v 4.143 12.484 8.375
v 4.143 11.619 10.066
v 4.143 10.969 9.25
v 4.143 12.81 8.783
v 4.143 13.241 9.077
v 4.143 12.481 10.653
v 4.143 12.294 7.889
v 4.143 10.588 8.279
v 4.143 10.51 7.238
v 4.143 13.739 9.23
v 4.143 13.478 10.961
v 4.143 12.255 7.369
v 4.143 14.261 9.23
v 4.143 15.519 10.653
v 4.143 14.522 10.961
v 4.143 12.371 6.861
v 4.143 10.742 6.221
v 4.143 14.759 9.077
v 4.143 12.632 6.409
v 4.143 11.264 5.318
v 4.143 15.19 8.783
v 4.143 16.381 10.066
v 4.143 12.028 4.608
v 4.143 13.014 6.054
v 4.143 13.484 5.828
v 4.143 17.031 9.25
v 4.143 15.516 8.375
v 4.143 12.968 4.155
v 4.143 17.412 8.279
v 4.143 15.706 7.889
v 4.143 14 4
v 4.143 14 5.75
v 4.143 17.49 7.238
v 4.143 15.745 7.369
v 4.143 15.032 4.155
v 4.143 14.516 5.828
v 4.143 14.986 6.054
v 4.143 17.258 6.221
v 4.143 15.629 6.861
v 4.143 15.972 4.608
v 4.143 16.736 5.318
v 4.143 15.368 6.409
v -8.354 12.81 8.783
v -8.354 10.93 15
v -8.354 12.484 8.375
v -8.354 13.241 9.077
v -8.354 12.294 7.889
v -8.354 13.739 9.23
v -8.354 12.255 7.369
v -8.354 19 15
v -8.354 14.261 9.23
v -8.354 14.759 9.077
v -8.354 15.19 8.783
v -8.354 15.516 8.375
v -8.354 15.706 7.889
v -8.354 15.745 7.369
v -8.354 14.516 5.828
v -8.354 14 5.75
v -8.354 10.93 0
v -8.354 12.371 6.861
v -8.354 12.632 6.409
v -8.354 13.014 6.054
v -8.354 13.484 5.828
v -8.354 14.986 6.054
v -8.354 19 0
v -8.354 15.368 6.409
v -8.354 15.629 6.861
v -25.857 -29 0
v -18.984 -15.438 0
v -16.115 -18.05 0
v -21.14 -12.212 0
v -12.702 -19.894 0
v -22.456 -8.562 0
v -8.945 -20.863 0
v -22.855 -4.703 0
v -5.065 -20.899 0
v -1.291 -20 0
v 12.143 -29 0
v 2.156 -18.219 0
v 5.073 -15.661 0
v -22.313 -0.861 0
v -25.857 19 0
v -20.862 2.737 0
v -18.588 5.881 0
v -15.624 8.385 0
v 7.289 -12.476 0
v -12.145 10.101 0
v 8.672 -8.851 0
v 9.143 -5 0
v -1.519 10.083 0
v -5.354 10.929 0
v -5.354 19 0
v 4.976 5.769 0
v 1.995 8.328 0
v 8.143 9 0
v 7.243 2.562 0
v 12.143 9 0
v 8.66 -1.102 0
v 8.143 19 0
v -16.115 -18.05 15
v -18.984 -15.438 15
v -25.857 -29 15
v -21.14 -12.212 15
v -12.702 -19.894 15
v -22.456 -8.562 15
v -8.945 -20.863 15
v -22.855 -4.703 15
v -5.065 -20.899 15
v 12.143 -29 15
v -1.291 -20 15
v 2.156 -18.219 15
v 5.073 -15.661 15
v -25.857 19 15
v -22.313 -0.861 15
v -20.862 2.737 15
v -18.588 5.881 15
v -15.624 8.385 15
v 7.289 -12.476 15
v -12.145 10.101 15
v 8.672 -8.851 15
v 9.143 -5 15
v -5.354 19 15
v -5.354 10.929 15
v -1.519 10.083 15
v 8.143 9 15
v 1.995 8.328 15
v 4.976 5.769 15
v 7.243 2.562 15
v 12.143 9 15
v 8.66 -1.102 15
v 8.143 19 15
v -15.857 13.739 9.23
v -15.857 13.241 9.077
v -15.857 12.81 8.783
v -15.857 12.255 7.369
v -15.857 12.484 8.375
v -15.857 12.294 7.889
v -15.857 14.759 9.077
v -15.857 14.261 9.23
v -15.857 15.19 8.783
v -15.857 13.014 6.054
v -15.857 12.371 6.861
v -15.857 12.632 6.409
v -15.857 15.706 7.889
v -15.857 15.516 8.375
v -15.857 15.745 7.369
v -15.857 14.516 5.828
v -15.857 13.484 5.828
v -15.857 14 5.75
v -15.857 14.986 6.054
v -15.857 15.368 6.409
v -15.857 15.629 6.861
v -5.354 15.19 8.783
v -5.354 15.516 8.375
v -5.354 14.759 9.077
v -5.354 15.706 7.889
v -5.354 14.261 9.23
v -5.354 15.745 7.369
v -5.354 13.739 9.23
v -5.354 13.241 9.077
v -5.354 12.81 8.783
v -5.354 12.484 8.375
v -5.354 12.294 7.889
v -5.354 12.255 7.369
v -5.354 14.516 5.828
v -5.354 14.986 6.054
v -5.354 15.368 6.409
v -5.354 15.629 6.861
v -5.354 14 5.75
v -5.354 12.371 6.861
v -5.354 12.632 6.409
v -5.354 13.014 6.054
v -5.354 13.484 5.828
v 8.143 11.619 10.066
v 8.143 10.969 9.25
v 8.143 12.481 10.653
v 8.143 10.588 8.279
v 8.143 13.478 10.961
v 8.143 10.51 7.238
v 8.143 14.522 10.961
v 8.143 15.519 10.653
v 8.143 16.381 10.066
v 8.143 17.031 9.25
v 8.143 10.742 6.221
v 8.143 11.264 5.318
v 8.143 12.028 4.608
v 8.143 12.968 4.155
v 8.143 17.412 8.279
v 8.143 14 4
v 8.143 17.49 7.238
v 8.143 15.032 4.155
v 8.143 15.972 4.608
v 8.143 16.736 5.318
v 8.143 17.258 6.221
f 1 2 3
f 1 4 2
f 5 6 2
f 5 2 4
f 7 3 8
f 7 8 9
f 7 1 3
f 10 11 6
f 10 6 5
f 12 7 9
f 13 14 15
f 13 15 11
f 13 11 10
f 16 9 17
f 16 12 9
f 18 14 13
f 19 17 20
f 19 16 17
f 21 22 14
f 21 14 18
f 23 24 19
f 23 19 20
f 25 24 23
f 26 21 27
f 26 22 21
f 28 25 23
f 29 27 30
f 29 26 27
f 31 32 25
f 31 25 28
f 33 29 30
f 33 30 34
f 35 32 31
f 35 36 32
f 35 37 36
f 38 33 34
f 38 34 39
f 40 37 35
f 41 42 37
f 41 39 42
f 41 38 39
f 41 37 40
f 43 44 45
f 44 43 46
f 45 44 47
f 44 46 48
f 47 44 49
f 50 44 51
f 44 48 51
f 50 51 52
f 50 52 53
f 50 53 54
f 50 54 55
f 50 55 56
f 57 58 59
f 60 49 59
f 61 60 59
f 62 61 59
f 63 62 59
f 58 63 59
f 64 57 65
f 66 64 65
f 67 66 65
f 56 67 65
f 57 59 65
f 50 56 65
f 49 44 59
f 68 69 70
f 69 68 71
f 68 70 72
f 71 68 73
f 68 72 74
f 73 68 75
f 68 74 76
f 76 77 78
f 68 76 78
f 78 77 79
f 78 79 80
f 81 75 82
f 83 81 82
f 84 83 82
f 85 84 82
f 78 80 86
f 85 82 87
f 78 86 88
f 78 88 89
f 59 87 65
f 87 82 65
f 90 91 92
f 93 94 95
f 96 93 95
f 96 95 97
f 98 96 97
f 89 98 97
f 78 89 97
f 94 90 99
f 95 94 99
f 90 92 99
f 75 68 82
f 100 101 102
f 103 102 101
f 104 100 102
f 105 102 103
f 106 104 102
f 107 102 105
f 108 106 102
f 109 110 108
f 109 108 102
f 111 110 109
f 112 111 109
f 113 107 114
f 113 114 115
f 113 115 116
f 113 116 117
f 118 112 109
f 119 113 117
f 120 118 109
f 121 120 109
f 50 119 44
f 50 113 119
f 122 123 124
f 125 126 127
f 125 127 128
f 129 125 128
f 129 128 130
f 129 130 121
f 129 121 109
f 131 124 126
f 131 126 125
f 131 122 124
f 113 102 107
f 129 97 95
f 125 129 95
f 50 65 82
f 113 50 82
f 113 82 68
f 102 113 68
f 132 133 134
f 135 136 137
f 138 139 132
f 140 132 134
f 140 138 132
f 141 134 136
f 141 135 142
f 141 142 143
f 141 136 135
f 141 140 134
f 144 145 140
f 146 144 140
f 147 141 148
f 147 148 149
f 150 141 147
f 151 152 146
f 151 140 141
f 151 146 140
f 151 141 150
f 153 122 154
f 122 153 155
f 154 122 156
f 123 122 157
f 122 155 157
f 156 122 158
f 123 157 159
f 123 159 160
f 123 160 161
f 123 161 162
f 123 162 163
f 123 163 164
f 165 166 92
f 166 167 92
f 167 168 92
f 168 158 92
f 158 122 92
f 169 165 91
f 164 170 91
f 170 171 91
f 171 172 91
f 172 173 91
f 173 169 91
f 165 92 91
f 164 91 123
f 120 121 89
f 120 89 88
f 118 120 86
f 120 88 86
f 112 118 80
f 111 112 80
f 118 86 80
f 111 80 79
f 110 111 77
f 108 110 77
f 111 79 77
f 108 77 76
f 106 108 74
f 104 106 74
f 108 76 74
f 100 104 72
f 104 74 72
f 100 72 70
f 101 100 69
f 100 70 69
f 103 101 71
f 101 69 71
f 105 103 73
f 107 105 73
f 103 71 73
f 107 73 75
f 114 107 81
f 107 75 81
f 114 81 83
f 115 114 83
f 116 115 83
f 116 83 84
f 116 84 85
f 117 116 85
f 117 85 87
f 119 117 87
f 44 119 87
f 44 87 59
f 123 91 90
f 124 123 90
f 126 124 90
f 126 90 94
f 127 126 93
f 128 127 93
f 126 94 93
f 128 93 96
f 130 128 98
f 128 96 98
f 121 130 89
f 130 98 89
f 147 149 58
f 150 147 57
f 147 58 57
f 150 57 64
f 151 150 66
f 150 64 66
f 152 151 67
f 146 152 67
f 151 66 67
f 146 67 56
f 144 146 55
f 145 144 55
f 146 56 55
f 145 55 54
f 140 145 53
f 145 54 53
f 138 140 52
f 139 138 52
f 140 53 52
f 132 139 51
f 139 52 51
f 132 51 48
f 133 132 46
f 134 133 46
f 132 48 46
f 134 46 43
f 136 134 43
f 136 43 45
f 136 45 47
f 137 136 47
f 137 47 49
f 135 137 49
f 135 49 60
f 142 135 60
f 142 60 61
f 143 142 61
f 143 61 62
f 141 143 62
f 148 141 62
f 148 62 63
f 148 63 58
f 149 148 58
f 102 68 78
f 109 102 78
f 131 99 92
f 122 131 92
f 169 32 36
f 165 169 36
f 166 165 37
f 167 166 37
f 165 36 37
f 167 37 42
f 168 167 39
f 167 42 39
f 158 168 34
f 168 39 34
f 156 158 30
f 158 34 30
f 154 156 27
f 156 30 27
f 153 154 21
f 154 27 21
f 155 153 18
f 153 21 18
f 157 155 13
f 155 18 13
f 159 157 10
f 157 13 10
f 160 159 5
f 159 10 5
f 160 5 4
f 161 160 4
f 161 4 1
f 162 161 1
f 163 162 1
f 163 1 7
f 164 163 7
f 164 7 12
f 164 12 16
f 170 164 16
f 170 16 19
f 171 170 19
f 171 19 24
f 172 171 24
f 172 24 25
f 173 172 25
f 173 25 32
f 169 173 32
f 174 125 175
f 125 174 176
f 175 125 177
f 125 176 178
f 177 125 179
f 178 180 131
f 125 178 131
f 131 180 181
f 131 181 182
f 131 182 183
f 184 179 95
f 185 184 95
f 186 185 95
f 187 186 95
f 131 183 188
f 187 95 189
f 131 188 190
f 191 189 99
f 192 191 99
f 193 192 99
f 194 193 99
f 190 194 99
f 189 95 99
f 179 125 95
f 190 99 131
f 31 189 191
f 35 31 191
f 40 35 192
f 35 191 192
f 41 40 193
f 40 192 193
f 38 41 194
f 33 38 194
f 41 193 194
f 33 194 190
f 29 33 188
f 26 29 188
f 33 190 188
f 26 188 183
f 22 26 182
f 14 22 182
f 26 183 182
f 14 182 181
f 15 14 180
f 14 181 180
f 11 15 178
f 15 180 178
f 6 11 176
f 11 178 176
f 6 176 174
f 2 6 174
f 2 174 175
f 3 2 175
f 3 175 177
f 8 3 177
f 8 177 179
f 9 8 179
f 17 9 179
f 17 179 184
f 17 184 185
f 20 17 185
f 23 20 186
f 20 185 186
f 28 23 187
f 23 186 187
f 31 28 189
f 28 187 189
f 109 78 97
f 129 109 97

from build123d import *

# Parameters (mm, degrees)
BOSS_EXTRU_1_DEPTH      = 15
ESQUISSE2_R             = 3.5
ENL_V_MAT_EXTRU_1_DEPTH = 4
ESQUISSE5_R             = 1.75
ENL_V_MAT_EXTRU_2_DEPTH = 20


with BuildPart() as part:
    # Esquisse1 → Boss.-Extru.1 (new body)
    with BuildSketch(Plane.XY):
        with BuildLine():
            Line((8.142533049, 9), (8.142533049, 19))
            Line((8.142533049, 19), (-5.354330929, 19))
            Line((-5.354330929, 19), (-5.354330929, 10.929236708))
            ThreePointArc((-5.354330929, 10.929236708), (4.975752737, 5.769164862), (9.142533049, -5))
            ThreePointArc((9.142533049, -5), (-17.628961192, -16.83109935), (-8.354330929, 10.929827313))
            Line((-8.354330929, 10.929827313), (-8.354330929, 19))
            Line((-8.354330929, 19), (-25.857466951, 19))
            Line((-25.857466951, 19), (-25.857466951, -29))
            Line((-25.857466951, -29), (12.142533049, -29))
            Line((12.142533049, -29), (12.142533049, 9))
            Line((12.142533049, 9), (8.142533049, 9))
        make_face()
    extrude(amount=BOSS_EXTRU_1_DEPTH)

    # Esquisse2 → Enlèv. mat.-Extru.1 (cut)
    with BuildSketch(Plane(origin=(8.142533049, 0, 0), x_dir=(0, 0, -1), z_dir=(1, 0, 0))):
        with Locations((-7.5, 14)):
            Circle(ESQUISSE2_R)
    extrude(amount=-ENL_V_MAT_EXTRU_1_DEPTH, mode=Mode.SUBTRACT)

    # Esquisse5 → Enlèv. mat.-Extru.2 (cut)
    with BuildSketch(Plane(origin=(4.142533049, 0, 0), x_dir=(0, 0, -1), z_dir=(1, 0, 0))):
        with Locations((-7.5, 14)):
            Circle(ESQUISSE5_R)
    extrude(amount=-ENL_V_MAT_EXTRU_2_DEPTH, mode=Mode.SUBTRACT)


solid = part.part
